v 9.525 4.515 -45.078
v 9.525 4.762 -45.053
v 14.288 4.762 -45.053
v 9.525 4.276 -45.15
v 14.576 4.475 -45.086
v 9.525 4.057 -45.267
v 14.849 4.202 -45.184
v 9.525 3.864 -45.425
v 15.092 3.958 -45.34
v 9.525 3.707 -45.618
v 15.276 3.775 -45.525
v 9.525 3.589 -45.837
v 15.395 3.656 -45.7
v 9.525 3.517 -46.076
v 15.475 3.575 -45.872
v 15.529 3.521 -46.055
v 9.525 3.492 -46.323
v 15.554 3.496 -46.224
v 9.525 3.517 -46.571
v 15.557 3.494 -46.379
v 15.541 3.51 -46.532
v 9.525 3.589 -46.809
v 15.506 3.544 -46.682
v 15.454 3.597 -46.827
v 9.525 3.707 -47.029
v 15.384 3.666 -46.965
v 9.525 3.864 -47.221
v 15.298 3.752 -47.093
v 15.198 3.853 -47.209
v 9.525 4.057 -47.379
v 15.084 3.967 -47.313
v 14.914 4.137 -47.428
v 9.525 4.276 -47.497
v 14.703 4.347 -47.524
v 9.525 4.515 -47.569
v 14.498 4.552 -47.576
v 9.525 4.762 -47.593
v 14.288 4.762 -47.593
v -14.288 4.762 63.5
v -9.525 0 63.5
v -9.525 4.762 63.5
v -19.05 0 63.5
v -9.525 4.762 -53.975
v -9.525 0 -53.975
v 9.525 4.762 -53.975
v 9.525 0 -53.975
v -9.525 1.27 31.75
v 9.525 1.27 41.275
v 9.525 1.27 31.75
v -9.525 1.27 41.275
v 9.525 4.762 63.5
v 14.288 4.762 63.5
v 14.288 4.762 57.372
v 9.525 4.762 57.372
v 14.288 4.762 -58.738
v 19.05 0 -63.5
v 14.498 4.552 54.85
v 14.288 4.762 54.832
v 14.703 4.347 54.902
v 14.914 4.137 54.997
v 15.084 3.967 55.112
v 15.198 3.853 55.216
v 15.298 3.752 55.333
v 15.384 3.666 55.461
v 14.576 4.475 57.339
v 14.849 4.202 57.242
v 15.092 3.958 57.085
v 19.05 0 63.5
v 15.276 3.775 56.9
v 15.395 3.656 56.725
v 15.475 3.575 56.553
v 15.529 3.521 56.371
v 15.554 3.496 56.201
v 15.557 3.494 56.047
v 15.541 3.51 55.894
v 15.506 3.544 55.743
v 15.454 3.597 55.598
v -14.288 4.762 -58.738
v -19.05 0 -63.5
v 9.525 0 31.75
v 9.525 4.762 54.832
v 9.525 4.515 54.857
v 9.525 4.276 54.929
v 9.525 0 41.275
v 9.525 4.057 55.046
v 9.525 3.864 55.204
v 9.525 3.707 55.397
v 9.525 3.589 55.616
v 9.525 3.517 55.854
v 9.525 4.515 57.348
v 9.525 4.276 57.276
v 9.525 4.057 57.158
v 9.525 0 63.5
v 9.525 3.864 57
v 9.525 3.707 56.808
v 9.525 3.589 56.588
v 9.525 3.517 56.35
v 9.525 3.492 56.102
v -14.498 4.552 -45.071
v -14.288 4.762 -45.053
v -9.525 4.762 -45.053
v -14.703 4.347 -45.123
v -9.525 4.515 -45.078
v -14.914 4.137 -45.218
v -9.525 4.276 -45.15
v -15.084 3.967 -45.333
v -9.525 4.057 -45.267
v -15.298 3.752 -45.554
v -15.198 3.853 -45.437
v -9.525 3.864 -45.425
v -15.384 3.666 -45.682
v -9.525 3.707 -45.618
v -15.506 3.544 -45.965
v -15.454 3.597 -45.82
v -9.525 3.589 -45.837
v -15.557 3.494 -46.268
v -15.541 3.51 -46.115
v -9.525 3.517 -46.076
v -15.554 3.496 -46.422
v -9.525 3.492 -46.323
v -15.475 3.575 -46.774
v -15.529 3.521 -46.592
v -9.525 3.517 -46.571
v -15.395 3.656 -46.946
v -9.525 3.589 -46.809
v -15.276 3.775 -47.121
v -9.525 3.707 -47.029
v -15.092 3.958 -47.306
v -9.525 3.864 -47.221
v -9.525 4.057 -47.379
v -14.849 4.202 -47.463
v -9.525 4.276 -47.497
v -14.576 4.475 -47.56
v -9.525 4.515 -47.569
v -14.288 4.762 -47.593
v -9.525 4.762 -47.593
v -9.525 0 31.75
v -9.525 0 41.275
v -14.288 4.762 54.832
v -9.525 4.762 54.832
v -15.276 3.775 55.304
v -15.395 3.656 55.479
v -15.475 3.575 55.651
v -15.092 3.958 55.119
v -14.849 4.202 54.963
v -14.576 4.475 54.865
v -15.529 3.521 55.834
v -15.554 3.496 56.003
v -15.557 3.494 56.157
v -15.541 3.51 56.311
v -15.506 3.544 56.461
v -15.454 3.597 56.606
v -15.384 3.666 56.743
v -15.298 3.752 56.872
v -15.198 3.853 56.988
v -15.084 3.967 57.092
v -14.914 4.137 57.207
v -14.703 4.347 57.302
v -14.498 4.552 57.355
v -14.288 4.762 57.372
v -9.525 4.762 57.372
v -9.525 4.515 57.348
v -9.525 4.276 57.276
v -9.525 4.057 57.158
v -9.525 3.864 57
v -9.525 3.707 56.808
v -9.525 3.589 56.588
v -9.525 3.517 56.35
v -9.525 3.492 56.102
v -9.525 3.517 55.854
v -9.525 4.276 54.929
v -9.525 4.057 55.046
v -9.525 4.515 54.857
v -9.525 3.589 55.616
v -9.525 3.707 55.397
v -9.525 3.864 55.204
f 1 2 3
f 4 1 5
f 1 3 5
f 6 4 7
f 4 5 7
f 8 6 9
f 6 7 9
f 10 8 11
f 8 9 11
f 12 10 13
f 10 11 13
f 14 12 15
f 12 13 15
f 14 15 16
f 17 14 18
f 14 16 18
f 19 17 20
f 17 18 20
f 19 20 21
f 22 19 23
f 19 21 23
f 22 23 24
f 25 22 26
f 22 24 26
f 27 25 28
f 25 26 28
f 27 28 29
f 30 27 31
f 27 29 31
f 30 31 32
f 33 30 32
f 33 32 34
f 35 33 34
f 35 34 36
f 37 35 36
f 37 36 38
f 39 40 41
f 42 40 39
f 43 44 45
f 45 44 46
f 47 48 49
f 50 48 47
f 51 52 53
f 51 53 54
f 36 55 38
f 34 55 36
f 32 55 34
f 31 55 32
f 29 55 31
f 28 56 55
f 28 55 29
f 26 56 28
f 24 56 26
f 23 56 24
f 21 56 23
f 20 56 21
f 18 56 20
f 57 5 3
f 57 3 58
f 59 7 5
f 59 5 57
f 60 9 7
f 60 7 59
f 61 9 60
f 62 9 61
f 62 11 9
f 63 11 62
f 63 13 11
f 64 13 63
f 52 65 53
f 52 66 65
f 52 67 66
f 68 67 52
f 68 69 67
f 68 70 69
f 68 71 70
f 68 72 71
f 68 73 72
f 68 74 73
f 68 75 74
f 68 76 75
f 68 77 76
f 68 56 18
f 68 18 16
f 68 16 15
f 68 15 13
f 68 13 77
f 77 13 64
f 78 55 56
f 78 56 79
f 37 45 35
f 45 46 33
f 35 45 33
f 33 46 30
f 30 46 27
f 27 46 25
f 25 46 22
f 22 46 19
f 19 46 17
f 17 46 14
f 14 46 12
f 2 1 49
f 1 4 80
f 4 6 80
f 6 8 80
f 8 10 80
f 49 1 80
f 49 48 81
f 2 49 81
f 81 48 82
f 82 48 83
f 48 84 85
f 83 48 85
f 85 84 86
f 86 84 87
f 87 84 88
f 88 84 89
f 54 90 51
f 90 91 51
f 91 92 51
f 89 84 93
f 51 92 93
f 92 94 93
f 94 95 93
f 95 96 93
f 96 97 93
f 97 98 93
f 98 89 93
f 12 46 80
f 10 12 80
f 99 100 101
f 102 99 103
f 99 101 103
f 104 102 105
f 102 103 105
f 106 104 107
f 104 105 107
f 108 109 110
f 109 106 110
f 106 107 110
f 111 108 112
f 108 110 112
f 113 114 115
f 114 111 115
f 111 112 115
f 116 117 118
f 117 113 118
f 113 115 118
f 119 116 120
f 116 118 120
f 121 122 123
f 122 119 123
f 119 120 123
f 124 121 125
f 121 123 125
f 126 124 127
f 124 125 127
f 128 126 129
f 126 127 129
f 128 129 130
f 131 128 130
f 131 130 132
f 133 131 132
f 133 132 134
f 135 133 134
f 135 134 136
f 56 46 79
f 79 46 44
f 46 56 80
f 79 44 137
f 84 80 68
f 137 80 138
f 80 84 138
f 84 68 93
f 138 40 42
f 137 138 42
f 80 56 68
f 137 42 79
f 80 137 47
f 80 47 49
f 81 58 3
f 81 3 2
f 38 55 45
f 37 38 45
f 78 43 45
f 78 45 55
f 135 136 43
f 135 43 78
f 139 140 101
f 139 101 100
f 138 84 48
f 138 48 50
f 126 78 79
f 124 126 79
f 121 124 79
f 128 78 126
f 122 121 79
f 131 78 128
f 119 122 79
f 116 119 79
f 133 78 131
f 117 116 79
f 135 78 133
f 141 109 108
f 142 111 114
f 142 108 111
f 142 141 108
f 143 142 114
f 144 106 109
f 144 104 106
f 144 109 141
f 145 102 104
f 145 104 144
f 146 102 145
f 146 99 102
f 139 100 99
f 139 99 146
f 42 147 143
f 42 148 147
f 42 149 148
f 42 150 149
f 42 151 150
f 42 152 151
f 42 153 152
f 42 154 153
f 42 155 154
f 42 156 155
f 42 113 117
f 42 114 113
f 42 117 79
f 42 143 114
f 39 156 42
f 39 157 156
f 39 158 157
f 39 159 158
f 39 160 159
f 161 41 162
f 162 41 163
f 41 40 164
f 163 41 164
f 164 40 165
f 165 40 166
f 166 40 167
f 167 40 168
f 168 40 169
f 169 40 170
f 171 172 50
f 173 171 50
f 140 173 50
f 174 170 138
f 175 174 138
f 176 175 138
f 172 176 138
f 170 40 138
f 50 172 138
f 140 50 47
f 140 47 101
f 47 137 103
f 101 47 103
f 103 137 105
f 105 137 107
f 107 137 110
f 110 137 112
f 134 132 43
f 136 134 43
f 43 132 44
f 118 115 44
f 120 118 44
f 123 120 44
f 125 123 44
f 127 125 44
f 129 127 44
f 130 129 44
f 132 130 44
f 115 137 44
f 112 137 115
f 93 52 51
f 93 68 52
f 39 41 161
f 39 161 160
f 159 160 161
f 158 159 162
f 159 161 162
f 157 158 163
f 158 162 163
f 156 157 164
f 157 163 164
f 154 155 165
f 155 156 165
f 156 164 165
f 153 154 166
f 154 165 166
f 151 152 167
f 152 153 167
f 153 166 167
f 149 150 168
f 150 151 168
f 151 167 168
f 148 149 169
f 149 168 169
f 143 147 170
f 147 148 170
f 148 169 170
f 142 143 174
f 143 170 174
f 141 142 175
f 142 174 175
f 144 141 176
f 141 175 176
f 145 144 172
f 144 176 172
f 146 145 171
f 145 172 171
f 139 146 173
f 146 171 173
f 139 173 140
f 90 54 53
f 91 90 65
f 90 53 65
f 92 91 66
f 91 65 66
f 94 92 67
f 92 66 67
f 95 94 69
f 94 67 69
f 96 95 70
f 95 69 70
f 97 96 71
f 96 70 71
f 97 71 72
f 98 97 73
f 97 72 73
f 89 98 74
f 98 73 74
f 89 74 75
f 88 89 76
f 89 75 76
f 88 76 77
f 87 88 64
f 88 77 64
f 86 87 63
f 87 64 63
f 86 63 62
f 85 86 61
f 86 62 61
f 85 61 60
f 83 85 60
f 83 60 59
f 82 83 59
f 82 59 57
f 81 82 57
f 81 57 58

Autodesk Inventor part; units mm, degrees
ref_plane "YZ Plane" through (0, 0, 0) normal (1, 0, 0) x (0, 1, 0)
ref_plane "XZ Plane" through (0, 0, 0) normal (0, 1, 0) x (-1, 0, 0)
ref_plane "XY Plane" through (0, 0, 0) normal (0, 0, 1) x (1, 0, 0)
sketch "Sketch1" plane through (0, 0, 0) normal (0, 1, 0) x (-1, 0, 0)
  line L0 (19.05, 63.5) -> (19.05, -63.5)
  line L1 (19.05, -63.5) -> (-19.05, -63.5)
  line L2 (-19.05, -63.5) -> (-19.05, 63.5)
  line L3 (9.525, 63.5) -> (9.525, -53.975)
  line L4 (9.525, -53.975) -> (-9.525, -53.975)
  line L5 (-9.525, -53.975) -> (-9.525, 63.5)
  line L6 (-19.05, 63.5) -> (-9.525, 63.5)
  line L7 (9.525, 63.5) -> (19.05, 63.5)
  line L8 (-9.525, 41.275) -> (9.525, 41.275)
  line L9 (9.525, 41.275) -> (9.525, 31.75)
  line L10 (9.525, 31.75) -> (-9.525, 31.75)
  line L11 (-9.525, 31.75) -> (-9.525, 41.275)
  point P0 (0, 0)
  dimension "d0" = 38.1
  dimension "d3" = 63.5
  dimension "d4" = 19.05
  dimension "d7" = 9.525
  dimension "d8" = 9.525
  dimension "d10" = 9.525
  dimension "d11" = 127
  dimension "d17" = 9.525
  dimension "d18" = 31.75
extrude "Extrusion2" add sketch "Sketch1" along normal blind 4.7625 contours L0 L1 L2 L6 L5 L4 L3 L7
extrude "Extrusion3" add sketch "Sketch1" along normal blind 1.27 contours L3 L10 L5 L8
chamfer "Chamfer1" distance 4.7625 angle 45 3 edges at (19.05, 4.7625, 0) (-19.05, 4.7625, 0) (0, 4.7625, -63.5)
sketch "Sketch2" plane through (0, 0, 0) normal (1, 0, 0) x (0, 1, 0)
  line L0 (0, -63.5) -> (0, -53.975) projected
  line L1 (0, -53.975) -> (4.7625, -53.975) projected
  line L2 (1.27, 31.75) -> (0, 31.75) projected
  line L3 (0, 31.75) -> (0, 41.275) projected
  line L4 (0, 41.275) -> (1.27, 41.275) projected
  line L5 (1.27, 41.275) -> (1.27, 31.75) projected
  line L6 (1.27, 31.75) -> (0, 31.75) projected
  line L7 (0, 31.75) -> (0, -53.975) projected
  line L8 (0, -53.975) -> (4.7625, -53.975) projected
  line L9 (0, 63.5) -> (4.7625, 63.5) projected
  line L10 (0, 63.5) -> (0, 41.275) projected
  line L11 (0, 41.275) -> (1.27, 41.275) projected
  line L12 (1.27, 41.275) -> (1.27, 31.75) projected
  circle A0 centre (4.7625, 56.1022) radius 1.27
  circle A1 centre (4.7625, -46.3233) radius 1.27
  line L13 (4.7625, -53.975) -> (4.7625, -58.7375) projected
  line L14 (4.7625, -58.7375) -> (0, -63.5) projected
  line L15 (4.7625, 63.5) -> (4.7625, -53.975) projected
  point P0 (0, 0)
  point P1 (6.35, -57.15)
  point P2 (6.35, -57.15)
  dimension "d24" = 7.3978
  dimension "d25" = 7.6517
  dimension "d26" = 2.54
  dimension "d27" = 4.7625
  dimension "d28" = 4.7625
extrude "Extrusion4" cut sketch "Sketch2" along normal through all both and the other way through all contours L15 A1 | A1 L15 | L15 A0 | A0 L15
equation "\"d3\" = 0.5 * d11"
equation "\"d4\" = 0.5 * d0"
equation "\"d8\" = d7"
equation "\"d10\" = d7"
equation "\"d17\" = d7"
equation "\"d18\" = 0.5 * d3"
equation "\"d12\" = 0.5 * d7"
equation "\"d14\" = 0.5 * d7"
equation "\"d27\" = 0.5 * d7"
equation "\"d28\" = d27"
equation "\"d22\" = 0.75 * d7"
properties part number "LegHolderV4"
